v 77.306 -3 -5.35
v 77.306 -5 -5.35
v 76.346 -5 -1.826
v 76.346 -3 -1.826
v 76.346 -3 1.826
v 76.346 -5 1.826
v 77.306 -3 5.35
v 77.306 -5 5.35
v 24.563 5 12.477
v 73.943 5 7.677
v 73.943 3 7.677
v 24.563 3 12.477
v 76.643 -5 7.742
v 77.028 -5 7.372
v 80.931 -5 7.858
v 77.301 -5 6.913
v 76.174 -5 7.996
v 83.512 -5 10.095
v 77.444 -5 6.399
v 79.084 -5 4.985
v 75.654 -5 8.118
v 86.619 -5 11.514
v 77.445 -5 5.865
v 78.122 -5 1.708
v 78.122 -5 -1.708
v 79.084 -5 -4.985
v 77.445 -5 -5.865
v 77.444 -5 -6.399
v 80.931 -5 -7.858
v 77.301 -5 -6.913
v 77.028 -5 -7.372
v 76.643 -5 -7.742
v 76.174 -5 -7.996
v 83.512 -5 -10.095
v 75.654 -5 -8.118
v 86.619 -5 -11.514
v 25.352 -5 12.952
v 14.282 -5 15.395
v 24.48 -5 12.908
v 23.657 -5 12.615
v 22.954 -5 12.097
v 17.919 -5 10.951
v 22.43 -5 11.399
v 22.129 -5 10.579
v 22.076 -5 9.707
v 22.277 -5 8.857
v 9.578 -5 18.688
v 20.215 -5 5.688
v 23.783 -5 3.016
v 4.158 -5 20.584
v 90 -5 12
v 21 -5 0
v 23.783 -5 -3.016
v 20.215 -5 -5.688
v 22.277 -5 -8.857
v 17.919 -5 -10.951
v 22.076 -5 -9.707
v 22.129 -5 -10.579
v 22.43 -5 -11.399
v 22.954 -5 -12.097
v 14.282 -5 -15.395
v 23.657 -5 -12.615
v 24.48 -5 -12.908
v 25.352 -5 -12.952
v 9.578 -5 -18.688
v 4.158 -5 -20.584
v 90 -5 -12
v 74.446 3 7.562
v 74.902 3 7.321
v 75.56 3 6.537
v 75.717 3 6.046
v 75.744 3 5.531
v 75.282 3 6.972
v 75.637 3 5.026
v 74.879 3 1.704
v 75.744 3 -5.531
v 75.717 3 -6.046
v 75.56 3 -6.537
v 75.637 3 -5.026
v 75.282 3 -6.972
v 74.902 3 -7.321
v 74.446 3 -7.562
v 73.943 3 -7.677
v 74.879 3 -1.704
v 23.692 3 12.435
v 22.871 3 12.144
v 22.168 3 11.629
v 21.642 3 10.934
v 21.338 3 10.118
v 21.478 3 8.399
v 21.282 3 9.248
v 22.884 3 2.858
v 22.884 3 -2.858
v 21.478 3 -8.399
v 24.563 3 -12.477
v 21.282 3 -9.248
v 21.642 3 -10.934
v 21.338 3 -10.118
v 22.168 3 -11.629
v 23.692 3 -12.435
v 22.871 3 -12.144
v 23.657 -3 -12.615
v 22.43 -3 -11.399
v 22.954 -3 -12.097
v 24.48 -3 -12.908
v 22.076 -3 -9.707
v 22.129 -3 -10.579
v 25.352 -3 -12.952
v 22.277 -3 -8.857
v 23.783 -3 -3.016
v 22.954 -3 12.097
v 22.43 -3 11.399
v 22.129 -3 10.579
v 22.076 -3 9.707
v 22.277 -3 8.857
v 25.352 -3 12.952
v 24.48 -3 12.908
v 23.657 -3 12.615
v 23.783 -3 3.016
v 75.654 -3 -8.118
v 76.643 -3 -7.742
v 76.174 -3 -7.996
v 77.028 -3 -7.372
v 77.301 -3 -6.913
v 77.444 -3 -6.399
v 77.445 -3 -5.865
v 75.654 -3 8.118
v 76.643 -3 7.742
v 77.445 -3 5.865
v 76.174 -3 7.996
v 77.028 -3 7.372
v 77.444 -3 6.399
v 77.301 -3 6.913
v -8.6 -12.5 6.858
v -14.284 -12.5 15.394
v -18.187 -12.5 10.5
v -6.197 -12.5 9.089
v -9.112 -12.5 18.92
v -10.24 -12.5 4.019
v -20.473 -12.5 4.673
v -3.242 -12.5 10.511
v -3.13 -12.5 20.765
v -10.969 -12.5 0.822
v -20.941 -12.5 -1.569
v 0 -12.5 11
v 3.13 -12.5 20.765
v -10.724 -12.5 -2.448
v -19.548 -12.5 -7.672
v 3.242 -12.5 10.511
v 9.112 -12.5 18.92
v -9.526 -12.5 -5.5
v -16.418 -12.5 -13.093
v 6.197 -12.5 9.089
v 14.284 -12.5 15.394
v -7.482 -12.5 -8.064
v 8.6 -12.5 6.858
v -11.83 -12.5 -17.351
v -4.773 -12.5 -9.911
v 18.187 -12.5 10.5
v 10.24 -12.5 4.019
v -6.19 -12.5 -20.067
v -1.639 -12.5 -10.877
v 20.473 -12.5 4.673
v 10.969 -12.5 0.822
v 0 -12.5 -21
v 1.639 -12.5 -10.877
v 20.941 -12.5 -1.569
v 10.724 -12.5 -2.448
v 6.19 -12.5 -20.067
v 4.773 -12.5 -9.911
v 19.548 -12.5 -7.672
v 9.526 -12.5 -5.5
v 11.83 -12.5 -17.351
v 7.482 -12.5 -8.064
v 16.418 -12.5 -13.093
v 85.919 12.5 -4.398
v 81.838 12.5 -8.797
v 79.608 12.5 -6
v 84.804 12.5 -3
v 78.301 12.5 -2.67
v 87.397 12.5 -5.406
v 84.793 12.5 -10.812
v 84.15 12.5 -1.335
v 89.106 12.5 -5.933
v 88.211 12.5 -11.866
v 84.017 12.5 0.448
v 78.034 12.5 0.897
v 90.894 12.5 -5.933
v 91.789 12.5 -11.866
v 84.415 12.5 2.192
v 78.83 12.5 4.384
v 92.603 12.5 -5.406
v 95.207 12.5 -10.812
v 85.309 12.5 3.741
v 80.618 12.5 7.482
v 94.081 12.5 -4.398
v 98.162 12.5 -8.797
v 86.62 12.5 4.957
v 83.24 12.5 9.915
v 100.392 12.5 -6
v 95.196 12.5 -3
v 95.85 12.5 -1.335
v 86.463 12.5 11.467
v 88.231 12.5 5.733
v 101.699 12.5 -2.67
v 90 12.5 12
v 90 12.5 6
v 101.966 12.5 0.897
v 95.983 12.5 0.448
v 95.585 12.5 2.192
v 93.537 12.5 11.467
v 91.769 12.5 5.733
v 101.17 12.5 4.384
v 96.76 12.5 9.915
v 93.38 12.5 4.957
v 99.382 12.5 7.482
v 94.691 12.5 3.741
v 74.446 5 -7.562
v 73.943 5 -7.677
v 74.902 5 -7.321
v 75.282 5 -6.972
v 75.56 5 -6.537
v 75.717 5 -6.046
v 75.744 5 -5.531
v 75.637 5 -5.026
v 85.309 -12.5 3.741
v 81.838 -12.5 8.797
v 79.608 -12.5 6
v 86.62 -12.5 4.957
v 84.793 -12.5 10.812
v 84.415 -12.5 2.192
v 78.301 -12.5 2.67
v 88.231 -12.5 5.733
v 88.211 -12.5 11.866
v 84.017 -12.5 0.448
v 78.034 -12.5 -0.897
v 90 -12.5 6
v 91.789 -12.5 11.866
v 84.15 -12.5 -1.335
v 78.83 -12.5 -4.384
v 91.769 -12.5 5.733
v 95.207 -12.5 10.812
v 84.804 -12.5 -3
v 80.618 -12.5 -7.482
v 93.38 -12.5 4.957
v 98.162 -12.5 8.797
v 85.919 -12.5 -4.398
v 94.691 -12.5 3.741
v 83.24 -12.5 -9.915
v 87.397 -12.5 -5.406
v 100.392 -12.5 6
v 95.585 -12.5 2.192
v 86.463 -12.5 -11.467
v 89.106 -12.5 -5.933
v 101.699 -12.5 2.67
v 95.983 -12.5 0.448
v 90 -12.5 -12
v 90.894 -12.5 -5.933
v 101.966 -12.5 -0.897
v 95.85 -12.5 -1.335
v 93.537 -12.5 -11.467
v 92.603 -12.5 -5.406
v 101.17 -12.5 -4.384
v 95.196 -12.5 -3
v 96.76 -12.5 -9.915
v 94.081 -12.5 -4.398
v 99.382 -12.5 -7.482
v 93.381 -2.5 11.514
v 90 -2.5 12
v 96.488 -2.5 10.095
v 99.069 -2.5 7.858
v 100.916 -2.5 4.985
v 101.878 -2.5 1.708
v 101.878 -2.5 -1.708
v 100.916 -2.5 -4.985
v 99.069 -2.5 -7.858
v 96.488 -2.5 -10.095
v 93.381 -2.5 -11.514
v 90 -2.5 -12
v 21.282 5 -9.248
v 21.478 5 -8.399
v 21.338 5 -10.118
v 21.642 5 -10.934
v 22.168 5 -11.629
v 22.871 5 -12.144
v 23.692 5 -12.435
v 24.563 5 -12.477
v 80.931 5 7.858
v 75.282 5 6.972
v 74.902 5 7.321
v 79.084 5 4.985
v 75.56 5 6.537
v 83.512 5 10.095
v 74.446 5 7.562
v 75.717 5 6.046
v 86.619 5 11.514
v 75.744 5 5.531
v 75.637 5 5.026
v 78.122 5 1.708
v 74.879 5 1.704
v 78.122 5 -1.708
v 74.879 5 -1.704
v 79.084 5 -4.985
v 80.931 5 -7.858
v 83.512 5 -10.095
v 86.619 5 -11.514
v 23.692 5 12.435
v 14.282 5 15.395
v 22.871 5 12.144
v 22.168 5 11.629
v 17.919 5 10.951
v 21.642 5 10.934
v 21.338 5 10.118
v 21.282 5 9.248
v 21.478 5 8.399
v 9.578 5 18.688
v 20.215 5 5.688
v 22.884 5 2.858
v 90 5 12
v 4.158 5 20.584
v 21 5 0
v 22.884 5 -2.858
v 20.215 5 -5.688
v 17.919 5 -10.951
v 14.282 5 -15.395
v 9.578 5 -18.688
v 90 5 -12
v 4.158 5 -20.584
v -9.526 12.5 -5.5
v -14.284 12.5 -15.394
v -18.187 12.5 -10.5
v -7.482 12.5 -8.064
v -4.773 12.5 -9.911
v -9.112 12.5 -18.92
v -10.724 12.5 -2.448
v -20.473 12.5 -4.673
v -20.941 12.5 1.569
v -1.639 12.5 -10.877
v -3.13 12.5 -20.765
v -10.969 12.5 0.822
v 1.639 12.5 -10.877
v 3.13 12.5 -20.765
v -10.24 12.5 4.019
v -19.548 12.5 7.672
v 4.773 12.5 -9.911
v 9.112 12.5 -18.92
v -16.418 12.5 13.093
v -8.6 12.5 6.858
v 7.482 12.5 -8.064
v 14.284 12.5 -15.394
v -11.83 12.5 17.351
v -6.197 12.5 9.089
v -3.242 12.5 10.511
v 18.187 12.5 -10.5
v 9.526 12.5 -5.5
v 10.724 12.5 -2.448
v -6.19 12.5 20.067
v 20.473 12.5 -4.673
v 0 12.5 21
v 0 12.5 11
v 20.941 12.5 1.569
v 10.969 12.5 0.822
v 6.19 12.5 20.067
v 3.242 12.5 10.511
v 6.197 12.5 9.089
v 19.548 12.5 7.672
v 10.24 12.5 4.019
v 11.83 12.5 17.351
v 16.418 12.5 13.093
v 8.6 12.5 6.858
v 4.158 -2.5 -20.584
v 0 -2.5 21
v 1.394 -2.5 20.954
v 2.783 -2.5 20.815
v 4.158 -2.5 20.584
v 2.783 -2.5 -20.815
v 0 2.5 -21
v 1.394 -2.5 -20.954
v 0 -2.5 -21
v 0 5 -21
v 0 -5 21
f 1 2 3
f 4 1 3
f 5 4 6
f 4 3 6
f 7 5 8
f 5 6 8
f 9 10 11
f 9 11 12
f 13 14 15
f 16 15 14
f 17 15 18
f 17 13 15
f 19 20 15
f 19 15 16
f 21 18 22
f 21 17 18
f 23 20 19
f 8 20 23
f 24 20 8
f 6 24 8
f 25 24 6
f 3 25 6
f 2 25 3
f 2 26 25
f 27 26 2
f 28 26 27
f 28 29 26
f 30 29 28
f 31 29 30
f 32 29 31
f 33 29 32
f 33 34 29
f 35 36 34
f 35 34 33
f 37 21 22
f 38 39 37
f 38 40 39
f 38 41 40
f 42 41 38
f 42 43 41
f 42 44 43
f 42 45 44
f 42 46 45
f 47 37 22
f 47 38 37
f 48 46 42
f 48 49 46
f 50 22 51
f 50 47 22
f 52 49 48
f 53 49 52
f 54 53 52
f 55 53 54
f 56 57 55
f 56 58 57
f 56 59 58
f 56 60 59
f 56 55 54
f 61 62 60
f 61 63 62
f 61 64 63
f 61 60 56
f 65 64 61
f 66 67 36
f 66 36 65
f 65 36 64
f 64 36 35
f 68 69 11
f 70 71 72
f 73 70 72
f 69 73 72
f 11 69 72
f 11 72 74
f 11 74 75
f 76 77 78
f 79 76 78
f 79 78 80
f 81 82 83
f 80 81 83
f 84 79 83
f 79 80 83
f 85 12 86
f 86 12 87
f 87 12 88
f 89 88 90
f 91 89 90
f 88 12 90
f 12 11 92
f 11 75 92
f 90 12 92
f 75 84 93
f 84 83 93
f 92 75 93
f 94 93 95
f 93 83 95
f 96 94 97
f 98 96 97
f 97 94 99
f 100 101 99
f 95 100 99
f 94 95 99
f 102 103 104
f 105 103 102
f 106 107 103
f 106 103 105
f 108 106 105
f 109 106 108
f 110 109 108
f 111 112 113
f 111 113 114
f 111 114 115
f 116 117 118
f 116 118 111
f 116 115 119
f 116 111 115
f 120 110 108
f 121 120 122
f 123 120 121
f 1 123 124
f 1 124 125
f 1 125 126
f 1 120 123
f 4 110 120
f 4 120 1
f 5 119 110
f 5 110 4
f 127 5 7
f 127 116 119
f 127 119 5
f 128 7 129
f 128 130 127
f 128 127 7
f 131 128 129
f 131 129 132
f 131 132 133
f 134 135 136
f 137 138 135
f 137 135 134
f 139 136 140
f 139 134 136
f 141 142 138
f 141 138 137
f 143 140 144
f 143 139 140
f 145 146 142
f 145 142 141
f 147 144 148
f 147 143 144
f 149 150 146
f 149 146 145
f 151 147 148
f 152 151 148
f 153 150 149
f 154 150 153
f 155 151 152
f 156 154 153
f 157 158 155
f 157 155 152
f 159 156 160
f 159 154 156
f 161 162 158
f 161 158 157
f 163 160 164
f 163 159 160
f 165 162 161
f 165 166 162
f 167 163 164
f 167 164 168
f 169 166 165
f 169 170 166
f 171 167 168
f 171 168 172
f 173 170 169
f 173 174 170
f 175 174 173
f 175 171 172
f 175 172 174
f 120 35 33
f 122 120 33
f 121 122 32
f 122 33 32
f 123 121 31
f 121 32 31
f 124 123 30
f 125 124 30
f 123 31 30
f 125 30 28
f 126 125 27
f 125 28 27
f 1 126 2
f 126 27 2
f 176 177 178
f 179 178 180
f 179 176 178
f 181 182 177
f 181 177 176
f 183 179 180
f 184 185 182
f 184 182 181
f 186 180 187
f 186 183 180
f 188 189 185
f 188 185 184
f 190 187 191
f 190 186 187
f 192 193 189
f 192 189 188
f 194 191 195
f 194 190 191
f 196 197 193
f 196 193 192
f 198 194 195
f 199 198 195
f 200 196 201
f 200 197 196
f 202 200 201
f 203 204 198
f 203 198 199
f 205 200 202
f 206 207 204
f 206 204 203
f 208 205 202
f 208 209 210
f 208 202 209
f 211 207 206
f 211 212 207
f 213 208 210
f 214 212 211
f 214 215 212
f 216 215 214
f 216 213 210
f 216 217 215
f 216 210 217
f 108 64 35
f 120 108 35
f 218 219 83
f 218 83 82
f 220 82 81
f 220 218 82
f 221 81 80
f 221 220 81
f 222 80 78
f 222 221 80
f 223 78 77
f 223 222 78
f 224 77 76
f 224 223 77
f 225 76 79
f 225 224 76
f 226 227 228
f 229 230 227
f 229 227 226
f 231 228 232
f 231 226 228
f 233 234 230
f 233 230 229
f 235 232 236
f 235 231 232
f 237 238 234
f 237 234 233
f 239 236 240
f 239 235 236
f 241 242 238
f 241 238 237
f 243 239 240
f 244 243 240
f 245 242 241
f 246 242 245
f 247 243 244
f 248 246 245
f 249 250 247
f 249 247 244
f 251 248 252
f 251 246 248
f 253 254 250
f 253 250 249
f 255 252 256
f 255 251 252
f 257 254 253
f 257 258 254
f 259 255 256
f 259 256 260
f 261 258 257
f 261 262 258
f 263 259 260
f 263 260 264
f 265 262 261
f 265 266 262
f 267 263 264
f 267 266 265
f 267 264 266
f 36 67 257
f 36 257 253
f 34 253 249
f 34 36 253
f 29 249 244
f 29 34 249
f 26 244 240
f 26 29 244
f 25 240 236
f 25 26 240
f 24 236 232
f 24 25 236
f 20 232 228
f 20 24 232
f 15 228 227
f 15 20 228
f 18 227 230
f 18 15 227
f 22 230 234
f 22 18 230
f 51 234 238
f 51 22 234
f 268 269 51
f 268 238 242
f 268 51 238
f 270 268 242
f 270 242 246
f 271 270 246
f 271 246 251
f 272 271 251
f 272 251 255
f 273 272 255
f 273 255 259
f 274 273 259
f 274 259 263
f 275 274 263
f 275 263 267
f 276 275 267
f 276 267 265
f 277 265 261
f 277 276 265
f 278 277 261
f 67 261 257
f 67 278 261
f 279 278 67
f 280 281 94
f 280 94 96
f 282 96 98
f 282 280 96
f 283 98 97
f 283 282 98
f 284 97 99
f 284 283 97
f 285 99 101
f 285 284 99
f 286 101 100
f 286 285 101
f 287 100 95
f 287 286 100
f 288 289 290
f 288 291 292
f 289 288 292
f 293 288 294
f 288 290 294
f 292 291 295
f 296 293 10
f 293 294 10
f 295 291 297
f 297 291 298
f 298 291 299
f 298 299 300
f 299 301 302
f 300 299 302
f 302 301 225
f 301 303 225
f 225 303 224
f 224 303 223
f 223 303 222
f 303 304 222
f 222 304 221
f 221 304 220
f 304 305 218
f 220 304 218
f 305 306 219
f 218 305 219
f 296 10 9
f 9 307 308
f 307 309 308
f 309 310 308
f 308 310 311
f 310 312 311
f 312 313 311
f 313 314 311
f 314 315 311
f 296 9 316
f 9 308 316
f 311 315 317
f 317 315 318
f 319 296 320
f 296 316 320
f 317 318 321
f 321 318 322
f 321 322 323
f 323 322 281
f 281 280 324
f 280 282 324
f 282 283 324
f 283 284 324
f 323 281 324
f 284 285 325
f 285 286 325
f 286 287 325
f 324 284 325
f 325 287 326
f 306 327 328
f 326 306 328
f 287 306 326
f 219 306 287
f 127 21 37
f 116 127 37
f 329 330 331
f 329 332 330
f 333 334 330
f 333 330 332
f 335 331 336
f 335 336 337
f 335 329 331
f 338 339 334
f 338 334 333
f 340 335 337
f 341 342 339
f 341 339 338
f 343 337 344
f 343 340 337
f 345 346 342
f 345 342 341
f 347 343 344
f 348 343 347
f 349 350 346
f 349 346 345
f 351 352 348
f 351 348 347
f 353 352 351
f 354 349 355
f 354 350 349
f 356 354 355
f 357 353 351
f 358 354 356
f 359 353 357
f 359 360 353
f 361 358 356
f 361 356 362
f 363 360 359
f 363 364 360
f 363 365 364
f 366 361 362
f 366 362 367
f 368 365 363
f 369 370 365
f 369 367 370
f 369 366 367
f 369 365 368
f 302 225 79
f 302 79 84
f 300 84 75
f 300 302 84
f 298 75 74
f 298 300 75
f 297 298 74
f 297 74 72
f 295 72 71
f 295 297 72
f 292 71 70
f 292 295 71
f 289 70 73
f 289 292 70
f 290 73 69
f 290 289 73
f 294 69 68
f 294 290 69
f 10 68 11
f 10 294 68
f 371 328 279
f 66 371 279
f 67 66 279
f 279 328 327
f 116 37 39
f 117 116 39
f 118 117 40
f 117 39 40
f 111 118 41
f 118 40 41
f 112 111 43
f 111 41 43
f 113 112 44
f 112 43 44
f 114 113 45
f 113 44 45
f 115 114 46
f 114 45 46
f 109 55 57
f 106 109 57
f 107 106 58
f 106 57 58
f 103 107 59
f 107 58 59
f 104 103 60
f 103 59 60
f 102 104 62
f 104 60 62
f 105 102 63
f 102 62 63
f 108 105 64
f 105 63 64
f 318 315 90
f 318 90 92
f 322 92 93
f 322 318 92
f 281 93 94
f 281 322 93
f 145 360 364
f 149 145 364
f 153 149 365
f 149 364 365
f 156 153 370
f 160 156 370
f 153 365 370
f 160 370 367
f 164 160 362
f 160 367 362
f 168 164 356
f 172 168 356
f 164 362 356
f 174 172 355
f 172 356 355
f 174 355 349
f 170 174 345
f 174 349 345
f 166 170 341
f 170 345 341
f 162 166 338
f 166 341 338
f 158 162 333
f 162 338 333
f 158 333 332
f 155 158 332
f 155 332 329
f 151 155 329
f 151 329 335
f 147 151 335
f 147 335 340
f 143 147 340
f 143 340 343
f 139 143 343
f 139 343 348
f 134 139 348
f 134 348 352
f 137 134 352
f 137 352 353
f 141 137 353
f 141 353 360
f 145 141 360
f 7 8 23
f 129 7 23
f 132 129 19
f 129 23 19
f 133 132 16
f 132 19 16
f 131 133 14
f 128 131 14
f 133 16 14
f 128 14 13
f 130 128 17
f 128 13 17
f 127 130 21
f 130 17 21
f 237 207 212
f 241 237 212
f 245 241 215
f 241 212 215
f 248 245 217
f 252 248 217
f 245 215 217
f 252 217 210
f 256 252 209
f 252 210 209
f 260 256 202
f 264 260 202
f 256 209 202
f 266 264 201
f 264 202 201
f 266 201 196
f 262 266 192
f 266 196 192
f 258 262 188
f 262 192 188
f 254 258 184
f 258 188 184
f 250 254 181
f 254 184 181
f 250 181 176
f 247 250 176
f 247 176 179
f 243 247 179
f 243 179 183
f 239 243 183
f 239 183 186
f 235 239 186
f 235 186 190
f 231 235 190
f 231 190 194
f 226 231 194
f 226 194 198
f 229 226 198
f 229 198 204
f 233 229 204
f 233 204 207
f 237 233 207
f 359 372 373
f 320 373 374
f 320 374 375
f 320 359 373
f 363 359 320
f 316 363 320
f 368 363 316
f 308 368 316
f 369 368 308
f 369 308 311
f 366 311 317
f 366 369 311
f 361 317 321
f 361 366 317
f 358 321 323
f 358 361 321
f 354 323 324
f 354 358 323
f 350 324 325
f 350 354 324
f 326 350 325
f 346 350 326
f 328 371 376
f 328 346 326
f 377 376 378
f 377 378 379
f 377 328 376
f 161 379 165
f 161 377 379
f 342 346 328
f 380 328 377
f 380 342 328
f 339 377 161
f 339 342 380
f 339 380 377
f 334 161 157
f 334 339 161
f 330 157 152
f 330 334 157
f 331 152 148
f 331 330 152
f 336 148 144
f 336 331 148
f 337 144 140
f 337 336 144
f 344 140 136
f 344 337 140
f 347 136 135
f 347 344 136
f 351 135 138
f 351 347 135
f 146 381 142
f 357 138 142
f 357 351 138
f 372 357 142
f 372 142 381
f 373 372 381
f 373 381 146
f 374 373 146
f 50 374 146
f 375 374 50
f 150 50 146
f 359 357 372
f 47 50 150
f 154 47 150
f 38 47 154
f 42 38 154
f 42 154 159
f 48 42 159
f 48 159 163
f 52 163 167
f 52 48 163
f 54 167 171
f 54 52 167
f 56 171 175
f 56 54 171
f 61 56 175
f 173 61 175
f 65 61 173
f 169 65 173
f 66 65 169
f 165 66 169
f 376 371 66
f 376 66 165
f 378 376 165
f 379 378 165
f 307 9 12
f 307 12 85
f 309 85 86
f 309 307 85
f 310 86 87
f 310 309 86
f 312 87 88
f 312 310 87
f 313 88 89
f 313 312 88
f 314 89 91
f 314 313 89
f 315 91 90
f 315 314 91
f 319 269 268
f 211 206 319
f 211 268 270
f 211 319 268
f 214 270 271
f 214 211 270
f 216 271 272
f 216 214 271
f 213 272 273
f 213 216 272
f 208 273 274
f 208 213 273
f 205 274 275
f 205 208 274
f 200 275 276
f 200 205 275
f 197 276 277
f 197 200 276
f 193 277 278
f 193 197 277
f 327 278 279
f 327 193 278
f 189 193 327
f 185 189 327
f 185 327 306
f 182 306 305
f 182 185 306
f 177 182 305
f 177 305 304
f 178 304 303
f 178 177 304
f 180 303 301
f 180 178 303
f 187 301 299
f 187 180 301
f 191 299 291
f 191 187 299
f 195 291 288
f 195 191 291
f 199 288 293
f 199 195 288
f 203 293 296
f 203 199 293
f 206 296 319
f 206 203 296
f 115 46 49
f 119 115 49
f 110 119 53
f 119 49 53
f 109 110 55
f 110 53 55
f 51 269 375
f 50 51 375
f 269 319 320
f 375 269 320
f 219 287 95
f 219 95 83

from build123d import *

# Parameters (mm, degrees)
BOSS_EXTRUDE1_DEPTH = 5
SKETCH2_R           = 21
BOSS_EXTRUDE3_DEPTH = 7.5
SKETCH3_R           = 12
BOSS_EXTRUDE4_DEPTH = 7.5
SKETCH4_R           = 21
BOSS_EXTRUDE6_DEPTH = 7.5
SKETCH5_R           = 12
BOSS_EXTRUDE7_DEPTH = 7.5
SKETCH6_R           = 11
CUT_EXTRUDE1_DEPTH  = 69
SKETCH7_R           = 6
CUT_EXTRUDE2_DEPTH  = 69
CUT_EXTRUDE4_DEPTH  = 2
CUT_EXTRUDE5_DEPTH  = 2


with BuildPart() as part:
    # Sketch1 → Boss-Extrude1 (new, symmetric)
    with BuildSketch(Plane(origin=(0, 0, 0), x_dir=(1, 0, 0), z_dir=(0, 1, 0))):
        Polygon((90, -12), (0, -21), (0, 21), (90, 12), align=None)
    extrude(amount=BOSS_EXTRUDE1_DEPTH, both=True)

    # Sketch2 → Boss-Extrude3 (add, symmetric)
    with BuildSketch(Plane(origin=(0, 5, 0), x_dir=(1, 0, 0), z_dir=(0, 1, 0))):
        with Locations(Location((0, 0, 0), (0, 0, 270))):
            Circle(SKETCH2_R)
    extrude(amount=BOSS_EXTRUDE3_DEPTH, both=True)

    # Sketch3 → Boss-Extrude4 (add, symmetric)
    with BuildSketch(Plane(origin=(0, 5, 0), x_dir=(1, 0, 0), z_dir=(0, 1, 0))):
        with Locations(Location((90, 0, 0), (0, 0, 270))):
            Circle(SKETCH3_R)
    extrude(amount=BOSS_EXTRUDE4_DEPTH, both=True)

    # Sketch4 → Boss-Extrude6 (add, symmetric)
    with BuildSketch(Plane.XZ.offset(5)):
        with Locations(Location((0, 0, 0), (0, 0, 270))):
            Circle(SKETCH4_R)
    extrude(amount=BOSS_EXTRUDE6_DEPTH, both=True)

    # Sketch5 → Boss-Extrude7 (add, symmetric)
    with BuildSketch(Plane.XZ.offset(5)):
        with Locations(Location((90, 0, 0), (0, 0, 270))):
            Circle(SKETCH5_R)
    extrude(amount=BOSS_EXTRUDE7_DEPTH, both=True)

    # Sketch6 → Cut-Extrude1 (cut)
    with BuildSketch(Plane(origin=(0, 12.5, 0), x_dir=(1, 0, 0), z_dir=(0, 1, 0))):
        with Locations(Location((0, 0, 0), (0, 0, 270))):
            Circle(SKETCH6_R)
    extrude(amount=-CUT_EXTRUDE1_DEPTH, mode=Mode.SUBTRACT)

    # Sketch7 → Cut-Extrude2 (cut)
    with BuildSketch(Plane(origin=(0, 12.5, 0), x_dir=(1, 0, 0), z_dir=(0, 1, 0))):
        with Locations(Location((90, 0, 0), (0, 0, 270))):
            Circle(SKETCH7_R)
    extrude(amount=-CUT_EXTRUDE2_DEPTH, mode=Mode.SUBTRACT)

    # Sketch8 → Cut-Extrude4 (cut)
    with BuildSketch(Plane(origin=(0, 5, 0), x_dir=(1, 0, 0), z_dir=(0, 1, 0))):
        with BuildLine():
            Line((24.562692553, 12.477391073), (73.943240769, 7.677349154))
            ThreePointArc((73.943240769, 7.677349154), (75.435017265, 6.76369448), (75.637490363, 5.026119554))
            ThreePointArc((75.637490363, 5.026119554), (74.783444514, 0), (75.637490363, -5.026119554))
            ThreePointArc((75.637490363, -5.026119554), (75.435017265, -6.76369448), (73.943240769, -7.677349154))
            Line((73.943240769, -7.677349154), (24.562692553, -12.477391073))
            ThreePointArc((24.562692553, -12.477391073), (21.879607854, -11.300975456), (21.478465069, -8.398910386))
            ThreePointArc((21.478465069, -8.398910386), (23.062223601, 0), (21.478465069, 8.398910386))
            ThreePointArc((21.478465069, 8.398910386), (21.879607854, 11.300975456), (24.562692553, 12.477391073))
        make_face()
    extrude(amount=-CUT_EXTRUDE4_DEPTH, mode=Mode.SUBTRACT)

    # Sketch9 → Cut-Extrude5 (cut)
    with BuildSketch(Plane.XZ.offset(5)):
        with BuildLine():
            Line((75.653851905, 8.117723123), (25.352219693, 12.951931944))
            ThreePointArc((25.352219693, 12.951931944), (22.666288444, 11.767102867), (22.27748823, 8.857312323))
            ThreePointArc((22.27748823, 8.857312323), (23.973703582, 0), (22.27748823, -8.857312323))
            ThreePointArc((22.27748823, -8.857312323), (22.666288444, -11.767102867), (25.352219693, -12.951931944))
            Line((25.352219693, -12.951931944), (75.653851905, -8.117723123))
            ThreePointArc((75.653851905, -8.117723123), (77.179932686, -7.151839338), (77.305529846, -5.35015141))
            ThreePointArc((77.305529846, -5.35015141), (76.224162726, 0), (77.305529846, 5.35015141))
            ThreePointArc((77.305529846, 5.35015141), (77.179932686, 7.151839338), (75.653851905, 8.117723123))
        make_face()
    extrude(amount=-CUT_EXTRUDE5_DEPTH, mode=Mode.SUBTRACT)


solid = part.part
